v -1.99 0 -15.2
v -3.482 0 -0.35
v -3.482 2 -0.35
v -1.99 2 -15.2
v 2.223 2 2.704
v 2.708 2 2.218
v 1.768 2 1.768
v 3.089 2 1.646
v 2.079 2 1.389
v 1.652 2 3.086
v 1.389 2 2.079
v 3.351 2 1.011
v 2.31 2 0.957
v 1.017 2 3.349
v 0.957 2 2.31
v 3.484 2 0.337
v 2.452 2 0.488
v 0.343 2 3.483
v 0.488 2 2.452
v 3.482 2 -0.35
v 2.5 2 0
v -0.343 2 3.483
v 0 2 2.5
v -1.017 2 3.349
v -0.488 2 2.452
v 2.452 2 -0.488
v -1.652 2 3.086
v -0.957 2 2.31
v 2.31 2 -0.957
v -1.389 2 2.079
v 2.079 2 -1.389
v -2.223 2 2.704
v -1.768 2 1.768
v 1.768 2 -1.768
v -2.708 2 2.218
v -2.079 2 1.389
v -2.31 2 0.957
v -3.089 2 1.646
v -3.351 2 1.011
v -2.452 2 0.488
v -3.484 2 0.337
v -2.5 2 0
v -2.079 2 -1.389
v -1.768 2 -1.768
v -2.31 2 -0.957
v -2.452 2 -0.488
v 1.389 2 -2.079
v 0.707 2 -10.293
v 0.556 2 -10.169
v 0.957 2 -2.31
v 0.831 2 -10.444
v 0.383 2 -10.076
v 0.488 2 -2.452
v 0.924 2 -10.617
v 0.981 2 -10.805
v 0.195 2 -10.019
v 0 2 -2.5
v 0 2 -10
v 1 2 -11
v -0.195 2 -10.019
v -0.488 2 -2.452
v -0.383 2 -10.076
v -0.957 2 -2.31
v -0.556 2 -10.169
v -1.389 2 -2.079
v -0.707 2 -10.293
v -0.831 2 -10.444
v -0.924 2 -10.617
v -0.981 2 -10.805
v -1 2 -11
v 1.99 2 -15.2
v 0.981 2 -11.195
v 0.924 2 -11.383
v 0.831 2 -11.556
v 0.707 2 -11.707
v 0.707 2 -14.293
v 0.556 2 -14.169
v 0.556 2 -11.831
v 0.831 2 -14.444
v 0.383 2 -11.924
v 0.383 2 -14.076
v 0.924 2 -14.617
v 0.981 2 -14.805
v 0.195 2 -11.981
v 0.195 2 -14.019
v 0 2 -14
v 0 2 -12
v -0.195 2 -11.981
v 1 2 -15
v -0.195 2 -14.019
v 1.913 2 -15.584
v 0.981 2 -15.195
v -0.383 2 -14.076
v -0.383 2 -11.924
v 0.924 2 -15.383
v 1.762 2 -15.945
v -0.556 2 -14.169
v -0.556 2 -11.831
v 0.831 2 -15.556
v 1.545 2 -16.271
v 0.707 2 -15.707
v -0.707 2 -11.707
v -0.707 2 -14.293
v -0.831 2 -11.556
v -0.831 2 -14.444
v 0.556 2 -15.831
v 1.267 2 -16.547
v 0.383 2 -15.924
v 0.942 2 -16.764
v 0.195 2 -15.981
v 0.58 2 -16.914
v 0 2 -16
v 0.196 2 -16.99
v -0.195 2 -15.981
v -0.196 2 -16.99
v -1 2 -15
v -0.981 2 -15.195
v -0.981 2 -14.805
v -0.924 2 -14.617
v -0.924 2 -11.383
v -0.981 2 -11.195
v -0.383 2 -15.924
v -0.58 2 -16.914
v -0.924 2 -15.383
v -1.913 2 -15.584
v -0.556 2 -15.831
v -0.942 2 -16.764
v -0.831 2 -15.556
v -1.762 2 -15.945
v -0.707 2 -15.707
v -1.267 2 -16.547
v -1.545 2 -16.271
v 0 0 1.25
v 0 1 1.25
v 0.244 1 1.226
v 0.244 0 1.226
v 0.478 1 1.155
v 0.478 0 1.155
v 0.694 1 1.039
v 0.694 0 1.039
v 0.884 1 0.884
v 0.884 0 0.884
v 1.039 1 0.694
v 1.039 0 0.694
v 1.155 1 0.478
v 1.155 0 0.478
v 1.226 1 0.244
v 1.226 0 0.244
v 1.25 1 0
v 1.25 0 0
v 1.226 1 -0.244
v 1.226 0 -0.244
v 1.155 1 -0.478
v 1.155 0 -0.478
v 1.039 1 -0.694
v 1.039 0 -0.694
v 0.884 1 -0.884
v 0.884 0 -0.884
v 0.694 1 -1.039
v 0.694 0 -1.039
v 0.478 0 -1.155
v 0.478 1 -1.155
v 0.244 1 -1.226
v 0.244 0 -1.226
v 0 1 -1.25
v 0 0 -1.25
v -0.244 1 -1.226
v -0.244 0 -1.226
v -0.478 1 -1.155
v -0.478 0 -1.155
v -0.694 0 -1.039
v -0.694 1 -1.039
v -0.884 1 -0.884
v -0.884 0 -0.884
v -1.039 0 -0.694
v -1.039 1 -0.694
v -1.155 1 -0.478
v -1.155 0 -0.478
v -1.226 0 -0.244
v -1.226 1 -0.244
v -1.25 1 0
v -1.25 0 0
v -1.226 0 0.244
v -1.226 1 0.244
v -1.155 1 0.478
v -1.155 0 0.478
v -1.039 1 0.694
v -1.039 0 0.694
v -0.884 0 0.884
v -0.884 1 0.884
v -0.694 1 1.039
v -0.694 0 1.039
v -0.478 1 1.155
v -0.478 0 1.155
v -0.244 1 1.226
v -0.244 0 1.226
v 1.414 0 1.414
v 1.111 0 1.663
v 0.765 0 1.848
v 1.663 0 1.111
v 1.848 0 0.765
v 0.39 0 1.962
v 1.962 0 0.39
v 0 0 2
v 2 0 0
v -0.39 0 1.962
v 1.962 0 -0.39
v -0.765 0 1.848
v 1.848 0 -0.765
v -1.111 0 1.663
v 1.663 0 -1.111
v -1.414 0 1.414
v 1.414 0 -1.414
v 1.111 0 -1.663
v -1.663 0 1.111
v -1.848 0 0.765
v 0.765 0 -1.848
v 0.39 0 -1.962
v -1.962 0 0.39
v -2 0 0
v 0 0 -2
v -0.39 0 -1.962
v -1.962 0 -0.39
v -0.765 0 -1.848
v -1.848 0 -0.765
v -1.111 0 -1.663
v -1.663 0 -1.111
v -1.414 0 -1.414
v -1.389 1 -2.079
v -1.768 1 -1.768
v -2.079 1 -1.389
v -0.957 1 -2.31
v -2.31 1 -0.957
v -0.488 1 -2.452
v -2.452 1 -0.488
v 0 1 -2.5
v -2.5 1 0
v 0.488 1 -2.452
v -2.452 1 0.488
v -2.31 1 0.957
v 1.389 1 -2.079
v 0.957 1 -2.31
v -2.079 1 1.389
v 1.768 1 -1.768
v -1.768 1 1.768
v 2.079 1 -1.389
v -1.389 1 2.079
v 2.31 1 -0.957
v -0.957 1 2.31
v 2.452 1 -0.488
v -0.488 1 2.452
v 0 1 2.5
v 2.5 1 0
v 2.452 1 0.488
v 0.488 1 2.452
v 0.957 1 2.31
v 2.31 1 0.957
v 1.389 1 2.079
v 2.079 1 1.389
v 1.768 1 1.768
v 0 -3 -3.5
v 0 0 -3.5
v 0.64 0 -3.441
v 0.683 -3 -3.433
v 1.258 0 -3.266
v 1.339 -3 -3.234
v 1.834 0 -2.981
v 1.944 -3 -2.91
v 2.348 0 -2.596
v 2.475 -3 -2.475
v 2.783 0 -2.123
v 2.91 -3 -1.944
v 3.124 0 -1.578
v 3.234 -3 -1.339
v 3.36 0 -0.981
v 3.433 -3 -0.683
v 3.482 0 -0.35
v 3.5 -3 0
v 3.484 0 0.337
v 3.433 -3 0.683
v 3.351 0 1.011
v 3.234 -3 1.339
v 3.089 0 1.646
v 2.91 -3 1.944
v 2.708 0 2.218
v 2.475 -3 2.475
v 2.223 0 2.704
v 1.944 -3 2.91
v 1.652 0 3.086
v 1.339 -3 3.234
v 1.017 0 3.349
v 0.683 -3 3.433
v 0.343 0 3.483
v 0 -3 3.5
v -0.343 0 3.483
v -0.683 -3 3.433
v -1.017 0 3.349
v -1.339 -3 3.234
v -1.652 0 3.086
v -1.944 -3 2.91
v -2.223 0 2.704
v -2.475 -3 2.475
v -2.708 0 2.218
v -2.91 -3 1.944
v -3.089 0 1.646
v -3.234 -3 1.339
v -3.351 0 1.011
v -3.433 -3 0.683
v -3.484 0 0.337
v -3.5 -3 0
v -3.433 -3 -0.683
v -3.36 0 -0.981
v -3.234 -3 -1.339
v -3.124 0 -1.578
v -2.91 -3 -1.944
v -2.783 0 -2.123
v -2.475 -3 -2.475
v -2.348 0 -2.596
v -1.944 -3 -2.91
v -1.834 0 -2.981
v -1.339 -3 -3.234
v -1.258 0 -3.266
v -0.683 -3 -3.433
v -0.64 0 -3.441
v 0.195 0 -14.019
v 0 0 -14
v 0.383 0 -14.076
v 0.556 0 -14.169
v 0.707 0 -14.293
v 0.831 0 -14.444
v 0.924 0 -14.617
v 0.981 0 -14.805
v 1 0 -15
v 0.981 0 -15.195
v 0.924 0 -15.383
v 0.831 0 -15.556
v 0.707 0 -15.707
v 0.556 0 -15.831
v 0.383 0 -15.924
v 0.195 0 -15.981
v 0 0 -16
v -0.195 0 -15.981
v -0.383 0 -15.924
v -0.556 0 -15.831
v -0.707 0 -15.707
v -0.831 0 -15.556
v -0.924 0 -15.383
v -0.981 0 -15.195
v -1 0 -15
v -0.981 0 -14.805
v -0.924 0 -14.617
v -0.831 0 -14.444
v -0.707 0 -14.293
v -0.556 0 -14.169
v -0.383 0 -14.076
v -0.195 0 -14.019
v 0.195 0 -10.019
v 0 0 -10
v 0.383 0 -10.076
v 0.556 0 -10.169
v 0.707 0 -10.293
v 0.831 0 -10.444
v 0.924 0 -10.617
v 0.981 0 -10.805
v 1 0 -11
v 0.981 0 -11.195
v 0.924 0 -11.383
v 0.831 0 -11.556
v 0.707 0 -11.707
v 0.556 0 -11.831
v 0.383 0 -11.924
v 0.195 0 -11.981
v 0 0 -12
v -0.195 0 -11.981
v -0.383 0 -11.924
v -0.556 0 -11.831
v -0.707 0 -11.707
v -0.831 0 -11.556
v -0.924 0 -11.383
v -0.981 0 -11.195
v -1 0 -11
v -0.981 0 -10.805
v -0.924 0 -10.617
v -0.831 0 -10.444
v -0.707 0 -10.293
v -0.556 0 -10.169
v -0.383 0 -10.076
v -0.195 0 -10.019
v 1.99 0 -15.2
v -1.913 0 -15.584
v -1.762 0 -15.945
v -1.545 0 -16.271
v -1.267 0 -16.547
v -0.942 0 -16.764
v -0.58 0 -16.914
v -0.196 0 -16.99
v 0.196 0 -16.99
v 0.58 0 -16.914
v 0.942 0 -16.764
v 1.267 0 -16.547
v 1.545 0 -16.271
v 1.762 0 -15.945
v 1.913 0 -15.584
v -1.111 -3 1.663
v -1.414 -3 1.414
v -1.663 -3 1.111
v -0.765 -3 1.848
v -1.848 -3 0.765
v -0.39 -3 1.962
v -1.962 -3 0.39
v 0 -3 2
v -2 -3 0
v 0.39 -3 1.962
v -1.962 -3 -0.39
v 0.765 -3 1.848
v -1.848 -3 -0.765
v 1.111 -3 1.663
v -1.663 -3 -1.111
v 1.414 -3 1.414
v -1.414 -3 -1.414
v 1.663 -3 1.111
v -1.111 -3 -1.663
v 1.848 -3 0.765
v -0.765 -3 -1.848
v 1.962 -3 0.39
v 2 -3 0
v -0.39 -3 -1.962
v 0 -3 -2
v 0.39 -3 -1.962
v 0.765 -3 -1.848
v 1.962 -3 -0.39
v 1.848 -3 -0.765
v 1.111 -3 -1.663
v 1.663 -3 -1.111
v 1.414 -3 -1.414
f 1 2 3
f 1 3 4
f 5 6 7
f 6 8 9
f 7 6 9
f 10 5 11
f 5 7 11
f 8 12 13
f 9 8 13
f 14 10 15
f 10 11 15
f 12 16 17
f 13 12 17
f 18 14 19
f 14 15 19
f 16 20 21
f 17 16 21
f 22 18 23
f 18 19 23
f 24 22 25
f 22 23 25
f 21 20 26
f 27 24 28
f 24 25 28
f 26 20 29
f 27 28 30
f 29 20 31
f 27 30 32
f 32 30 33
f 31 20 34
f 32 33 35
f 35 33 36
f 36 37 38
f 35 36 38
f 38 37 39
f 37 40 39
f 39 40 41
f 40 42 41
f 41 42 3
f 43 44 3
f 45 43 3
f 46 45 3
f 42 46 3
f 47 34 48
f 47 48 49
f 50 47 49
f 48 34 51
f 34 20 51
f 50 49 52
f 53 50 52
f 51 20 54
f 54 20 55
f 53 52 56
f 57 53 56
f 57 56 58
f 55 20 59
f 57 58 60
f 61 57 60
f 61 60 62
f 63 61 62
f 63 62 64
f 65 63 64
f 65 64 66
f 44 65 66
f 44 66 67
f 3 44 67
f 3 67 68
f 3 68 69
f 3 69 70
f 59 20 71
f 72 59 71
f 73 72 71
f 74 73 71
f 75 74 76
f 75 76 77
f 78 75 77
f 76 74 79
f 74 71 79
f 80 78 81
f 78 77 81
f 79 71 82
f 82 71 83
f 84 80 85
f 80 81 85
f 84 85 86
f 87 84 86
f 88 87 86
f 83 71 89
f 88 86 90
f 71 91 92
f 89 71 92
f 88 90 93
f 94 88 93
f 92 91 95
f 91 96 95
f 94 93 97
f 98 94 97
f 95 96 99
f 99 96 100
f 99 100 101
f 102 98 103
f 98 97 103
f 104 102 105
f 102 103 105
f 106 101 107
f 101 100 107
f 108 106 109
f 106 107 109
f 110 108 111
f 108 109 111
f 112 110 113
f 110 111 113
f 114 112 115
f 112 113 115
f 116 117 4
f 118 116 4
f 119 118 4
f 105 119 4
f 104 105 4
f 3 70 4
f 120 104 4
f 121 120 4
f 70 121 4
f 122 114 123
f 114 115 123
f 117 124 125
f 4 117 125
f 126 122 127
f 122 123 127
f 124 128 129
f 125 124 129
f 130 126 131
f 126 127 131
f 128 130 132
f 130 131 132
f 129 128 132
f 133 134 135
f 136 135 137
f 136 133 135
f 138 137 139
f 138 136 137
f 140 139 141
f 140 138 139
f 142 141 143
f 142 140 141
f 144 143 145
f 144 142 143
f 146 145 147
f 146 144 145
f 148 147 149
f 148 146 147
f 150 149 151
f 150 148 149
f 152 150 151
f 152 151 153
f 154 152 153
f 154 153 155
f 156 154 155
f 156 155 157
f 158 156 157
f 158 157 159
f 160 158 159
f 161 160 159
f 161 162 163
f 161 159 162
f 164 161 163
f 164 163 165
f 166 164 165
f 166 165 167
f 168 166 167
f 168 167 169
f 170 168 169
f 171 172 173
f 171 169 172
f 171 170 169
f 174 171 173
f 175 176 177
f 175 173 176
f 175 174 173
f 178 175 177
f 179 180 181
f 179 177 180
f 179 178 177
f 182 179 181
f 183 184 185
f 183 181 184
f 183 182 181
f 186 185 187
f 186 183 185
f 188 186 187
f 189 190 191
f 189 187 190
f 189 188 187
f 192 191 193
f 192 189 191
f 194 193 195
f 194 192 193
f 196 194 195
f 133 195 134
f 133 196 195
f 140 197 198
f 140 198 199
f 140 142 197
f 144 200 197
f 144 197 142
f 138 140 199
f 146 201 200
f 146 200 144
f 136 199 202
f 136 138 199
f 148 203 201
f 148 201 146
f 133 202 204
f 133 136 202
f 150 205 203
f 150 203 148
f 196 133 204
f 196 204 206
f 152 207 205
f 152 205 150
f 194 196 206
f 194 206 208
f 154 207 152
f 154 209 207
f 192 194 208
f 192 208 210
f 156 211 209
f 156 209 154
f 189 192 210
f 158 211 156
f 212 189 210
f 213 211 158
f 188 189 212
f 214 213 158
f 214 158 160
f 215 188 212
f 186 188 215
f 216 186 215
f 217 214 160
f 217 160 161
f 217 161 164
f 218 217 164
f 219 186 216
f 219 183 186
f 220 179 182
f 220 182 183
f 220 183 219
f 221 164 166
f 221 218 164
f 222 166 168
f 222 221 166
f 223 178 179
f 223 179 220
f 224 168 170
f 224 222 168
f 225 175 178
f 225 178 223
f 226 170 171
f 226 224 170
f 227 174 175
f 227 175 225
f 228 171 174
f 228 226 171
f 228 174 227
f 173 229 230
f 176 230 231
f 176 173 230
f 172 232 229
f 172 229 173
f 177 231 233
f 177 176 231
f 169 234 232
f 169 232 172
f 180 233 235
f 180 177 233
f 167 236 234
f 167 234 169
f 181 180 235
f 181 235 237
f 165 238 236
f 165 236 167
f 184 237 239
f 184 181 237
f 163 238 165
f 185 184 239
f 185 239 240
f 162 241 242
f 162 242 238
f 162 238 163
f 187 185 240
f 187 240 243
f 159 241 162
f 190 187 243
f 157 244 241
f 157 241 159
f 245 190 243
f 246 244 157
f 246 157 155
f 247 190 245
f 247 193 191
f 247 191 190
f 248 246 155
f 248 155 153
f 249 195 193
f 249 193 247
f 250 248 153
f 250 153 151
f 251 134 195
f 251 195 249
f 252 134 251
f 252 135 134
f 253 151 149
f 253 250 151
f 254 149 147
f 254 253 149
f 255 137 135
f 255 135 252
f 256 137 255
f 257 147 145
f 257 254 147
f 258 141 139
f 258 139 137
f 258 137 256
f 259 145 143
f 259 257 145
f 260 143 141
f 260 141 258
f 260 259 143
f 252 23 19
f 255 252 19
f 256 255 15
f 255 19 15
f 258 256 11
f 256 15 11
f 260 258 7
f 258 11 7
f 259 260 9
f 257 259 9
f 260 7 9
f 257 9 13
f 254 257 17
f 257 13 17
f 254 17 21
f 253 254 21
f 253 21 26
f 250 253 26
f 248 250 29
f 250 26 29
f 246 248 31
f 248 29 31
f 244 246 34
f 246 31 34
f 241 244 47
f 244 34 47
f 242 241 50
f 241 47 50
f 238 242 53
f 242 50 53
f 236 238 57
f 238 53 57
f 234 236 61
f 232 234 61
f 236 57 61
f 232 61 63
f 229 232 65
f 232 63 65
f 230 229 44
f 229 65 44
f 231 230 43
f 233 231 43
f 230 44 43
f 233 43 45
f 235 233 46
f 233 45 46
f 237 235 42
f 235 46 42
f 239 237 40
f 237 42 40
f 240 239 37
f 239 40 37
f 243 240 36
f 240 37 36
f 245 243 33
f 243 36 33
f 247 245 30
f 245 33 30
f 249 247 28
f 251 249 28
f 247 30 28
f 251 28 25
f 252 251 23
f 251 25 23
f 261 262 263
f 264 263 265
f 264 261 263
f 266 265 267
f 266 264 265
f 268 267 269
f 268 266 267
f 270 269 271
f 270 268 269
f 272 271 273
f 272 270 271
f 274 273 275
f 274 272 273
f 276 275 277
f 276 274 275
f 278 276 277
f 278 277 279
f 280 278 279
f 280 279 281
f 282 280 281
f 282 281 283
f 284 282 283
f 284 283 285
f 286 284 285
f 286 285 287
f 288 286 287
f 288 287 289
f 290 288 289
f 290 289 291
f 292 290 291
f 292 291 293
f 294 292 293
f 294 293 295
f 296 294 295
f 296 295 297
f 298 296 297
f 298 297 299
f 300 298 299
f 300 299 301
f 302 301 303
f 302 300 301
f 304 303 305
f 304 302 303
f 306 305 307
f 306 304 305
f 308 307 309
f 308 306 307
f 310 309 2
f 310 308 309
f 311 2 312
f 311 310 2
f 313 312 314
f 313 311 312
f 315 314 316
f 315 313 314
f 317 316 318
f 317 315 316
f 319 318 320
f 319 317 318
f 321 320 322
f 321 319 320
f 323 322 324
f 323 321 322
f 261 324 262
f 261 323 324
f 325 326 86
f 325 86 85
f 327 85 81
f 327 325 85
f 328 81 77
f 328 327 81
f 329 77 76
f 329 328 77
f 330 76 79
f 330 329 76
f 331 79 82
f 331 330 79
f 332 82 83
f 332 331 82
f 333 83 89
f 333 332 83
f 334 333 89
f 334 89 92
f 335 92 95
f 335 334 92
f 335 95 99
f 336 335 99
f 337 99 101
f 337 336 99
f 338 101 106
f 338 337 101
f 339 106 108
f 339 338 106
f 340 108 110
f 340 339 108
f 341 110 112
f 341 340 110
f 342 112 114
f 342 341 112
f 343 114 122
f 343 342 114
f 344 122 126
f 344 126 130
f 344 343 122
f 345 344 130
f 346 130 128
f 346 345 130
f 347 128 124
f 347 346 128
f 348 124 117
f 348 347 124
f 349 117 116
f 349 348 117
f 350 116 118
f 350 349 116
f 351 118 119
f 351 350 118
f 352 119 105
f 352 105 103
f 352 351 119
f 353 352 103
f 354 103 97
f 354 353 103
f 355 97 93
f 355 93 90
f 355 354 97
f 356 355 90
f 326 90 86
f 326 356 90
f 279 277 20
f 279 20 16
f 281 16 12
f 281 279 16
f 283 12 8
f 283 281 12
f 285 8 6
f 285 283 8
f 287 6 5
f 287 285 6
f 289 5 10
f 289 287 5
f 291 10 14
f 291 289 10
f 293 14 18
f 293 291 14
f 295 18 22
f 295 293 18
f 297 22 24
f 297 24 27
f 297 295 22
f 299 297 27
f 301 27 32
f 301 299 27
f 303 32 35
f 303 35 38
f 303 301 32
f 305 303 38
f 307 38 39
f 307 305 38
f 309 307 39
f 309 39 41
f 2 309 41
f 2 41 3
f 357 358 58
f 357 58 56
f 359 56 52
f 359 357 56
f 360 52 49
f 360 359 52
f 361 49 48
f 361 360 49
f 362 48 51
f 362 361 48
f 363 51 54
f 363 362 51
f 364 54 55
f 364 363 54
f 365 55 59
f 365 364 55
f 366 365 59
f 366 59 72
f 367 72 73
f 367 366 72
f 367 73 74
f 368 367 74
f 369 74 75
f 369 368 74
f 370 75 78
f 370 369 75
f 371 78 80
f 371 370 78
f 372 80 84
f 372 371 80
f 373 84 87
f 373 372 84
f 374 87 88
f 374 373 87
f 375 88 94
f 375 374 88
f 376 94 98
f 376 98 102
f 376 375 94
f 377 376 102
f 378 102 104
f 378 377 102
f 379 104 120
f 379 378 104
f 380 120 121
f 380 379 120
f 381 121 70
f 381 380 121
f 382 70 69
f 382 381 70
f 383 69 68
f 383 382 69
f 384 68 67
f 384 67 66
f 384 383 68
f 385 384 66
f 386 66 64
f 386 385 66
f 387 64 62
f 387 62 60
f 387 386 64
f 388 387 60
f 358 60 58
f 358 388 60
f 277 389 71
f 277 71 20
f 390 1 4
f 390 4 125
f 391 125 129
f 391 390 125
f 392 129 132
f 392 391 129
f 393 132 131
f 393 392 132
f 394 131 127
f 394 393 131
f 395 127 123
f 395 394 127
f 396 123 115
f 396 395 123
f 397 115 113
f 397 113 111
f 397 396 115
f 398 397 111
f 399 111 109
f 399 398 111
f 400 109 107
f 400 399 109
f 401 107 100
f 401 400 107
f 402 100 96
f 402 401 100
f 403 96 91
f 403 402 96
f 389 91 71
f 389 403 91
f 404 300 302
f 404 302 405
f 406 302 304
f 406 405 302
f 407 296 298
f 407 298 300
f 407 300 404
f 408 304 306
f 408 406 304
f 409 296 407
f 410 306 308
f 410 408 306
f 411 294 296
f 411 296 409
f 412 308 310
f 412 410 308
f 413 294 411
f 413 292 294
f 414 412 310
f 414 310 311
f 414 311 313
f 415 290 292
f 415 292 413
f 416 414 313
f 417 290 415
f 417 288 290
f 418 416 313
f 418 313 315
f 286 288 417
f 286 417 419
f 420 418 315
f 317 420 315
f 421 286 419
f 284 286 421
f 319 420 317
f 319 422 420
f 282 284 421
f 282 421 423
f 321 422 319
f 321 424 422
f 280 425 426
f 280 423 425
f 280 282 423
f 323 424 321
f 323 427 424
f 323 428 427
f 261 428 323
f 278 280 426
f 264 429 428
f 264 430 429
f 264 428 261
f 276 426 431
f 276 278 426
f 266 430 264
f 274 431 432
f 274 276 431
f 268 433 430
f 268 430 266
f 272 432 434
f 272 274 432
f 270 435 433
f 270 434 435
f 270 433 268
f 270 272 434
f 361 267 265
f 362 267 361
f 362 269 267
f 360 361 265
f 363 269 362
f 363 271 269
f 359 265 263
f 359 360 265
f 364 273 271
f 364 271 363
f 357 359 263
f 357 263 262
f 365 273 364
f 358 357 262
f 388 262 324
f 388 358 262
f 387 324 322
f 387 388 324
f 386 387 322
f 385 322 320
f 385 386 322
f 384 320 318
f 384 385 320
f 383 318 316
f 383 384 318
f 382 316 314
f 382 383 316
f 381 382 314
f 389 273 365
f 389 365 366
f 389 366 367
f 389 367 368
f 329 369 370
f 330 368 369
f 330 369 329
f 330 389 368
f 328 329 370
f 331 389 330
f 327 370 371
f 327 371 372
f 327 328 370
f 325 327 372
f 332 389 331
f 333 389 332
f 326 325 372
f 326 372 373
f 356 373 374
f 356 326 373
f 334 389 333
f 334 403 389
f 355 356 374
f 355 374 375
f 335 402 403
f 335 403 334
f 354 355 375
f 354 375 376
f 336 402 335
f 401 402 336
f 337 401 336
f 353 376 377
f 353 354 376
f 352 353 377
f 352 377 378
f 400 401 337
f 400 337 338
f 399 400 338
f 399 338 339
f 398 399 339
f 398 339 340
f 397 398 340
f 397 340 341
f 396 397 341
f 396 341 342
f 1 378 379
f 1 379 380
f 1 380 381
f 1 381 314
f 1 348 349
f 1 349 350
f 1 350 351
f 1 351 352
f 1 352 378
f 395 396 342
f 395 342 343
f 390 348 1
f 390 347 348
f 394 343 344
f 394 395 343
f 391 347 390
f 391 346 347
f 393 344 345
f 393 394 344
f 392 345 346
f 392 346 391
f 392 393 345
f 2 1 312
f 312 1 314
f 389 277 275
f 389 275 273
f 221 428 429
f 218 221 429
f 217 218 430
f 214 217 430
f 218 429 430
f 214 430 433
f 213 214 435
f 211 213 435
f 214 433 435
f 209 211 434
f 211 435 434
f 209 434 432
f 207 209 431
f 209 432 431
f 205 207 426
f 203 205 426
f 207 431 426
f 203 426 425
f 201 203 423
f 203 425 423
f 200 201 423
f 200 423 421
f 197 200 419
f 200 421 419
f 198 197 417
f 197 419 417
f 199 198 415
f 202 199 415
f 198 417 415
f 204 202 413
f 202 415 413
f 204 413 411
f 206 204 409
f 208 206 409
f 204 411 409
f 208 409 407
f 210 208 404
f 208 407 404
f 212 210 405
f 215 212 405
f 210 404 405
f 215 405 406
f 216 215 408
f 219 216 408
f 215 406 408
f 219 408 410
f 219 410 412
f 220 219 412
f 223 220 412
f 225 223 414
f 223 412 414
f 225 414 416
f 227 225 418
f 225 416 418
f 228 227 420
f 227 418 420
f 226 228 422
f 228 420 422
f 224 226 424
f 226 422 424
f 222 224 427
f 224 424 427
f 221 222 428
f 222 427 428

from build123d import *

# Parameters (mm, degrees)
SKETCH_1_R          = 1
SKETCH_1_R_2        = 1.25
EXTRUDE_1_DEPTH     = 2
EXTRUDE_START       = 3
SKETCH_2_R          = 3.5
SKETCH_2_R_2        = 2
EXTRUDE_2_DEPTH     = 3
SKETCH_3_R          = 2.5
CUT_EXTRUDE_1_DEPTH = 1


with BuildPart() as part:
    # 草图1 → 凸台-拉伸1 (new body)
    with BuildSketch(Plane(origin=(0, 0, 0), x_dir=(1, 0, 0), z_dir=(0, 1, 0))):
        with BuildLine():
            Line((-3.48245603, 0.35), (-1.989974874, 15.2))
            ThreePointArc((-1.989974874, 15.2), (0, 17), (1.989974874, 15.2))
            Line((1.989974874, 15.2), (3.48245603, 0.35))
            ThreePointArc((3.48245603, 0.35), (0, -3.5), (-3.48245603, 0.35))
        make_face()
        with Locations(Location((0, 15, 0), (0, 0, 270))):
            Circle(SKETCH_1_R, mode=Mode.SUBTRACT)
        with Locations(Location((0, 11, 0), (0, 0, 270))):
            Circle(SKETCH_1_R, mode=Mode.SUBTRACT)
        with Locations(Location((0, 0, 0), (0, 0, 270))):
            Circle(SKETCH_1_R_2, mode=Mode.SUBTRACT)
    extrude(amount=EXTRUDE_1_DEPTH)

    # 草图2 → 凸台-拉伸2 (add)
    with BuildSketch(Plane.XZ.offset(EXTRUDE_START)):
        with Locations(Location((0, 0, 0), (0, 0, 270))):
            Circle(SKETCH_2_R)
        with Locations(Location((0, 0, 0), (0, 0, 270))):
            Circle(SKETCH_2_R_2, mode=Mode.SUBTRACT)
    extrude(amount=-EXTRUDE_2_DEPTH)

    # 草图3 → 切除-拉伸1 (cut)
    with BuildSketch(Plane(origin=(0, 2, 0), x_dir=(1, 0, 0), z_dir=(0, 1, 0))):
        with Locations(Location((0, 0, 0), (0, 0, 270))):
            Circle(SKETCH_3_R)
    extrude(amount=-CUT_EXTRUDE_1_DEPTH, mode=Mode.SUBTRACT)


solid = part.part
